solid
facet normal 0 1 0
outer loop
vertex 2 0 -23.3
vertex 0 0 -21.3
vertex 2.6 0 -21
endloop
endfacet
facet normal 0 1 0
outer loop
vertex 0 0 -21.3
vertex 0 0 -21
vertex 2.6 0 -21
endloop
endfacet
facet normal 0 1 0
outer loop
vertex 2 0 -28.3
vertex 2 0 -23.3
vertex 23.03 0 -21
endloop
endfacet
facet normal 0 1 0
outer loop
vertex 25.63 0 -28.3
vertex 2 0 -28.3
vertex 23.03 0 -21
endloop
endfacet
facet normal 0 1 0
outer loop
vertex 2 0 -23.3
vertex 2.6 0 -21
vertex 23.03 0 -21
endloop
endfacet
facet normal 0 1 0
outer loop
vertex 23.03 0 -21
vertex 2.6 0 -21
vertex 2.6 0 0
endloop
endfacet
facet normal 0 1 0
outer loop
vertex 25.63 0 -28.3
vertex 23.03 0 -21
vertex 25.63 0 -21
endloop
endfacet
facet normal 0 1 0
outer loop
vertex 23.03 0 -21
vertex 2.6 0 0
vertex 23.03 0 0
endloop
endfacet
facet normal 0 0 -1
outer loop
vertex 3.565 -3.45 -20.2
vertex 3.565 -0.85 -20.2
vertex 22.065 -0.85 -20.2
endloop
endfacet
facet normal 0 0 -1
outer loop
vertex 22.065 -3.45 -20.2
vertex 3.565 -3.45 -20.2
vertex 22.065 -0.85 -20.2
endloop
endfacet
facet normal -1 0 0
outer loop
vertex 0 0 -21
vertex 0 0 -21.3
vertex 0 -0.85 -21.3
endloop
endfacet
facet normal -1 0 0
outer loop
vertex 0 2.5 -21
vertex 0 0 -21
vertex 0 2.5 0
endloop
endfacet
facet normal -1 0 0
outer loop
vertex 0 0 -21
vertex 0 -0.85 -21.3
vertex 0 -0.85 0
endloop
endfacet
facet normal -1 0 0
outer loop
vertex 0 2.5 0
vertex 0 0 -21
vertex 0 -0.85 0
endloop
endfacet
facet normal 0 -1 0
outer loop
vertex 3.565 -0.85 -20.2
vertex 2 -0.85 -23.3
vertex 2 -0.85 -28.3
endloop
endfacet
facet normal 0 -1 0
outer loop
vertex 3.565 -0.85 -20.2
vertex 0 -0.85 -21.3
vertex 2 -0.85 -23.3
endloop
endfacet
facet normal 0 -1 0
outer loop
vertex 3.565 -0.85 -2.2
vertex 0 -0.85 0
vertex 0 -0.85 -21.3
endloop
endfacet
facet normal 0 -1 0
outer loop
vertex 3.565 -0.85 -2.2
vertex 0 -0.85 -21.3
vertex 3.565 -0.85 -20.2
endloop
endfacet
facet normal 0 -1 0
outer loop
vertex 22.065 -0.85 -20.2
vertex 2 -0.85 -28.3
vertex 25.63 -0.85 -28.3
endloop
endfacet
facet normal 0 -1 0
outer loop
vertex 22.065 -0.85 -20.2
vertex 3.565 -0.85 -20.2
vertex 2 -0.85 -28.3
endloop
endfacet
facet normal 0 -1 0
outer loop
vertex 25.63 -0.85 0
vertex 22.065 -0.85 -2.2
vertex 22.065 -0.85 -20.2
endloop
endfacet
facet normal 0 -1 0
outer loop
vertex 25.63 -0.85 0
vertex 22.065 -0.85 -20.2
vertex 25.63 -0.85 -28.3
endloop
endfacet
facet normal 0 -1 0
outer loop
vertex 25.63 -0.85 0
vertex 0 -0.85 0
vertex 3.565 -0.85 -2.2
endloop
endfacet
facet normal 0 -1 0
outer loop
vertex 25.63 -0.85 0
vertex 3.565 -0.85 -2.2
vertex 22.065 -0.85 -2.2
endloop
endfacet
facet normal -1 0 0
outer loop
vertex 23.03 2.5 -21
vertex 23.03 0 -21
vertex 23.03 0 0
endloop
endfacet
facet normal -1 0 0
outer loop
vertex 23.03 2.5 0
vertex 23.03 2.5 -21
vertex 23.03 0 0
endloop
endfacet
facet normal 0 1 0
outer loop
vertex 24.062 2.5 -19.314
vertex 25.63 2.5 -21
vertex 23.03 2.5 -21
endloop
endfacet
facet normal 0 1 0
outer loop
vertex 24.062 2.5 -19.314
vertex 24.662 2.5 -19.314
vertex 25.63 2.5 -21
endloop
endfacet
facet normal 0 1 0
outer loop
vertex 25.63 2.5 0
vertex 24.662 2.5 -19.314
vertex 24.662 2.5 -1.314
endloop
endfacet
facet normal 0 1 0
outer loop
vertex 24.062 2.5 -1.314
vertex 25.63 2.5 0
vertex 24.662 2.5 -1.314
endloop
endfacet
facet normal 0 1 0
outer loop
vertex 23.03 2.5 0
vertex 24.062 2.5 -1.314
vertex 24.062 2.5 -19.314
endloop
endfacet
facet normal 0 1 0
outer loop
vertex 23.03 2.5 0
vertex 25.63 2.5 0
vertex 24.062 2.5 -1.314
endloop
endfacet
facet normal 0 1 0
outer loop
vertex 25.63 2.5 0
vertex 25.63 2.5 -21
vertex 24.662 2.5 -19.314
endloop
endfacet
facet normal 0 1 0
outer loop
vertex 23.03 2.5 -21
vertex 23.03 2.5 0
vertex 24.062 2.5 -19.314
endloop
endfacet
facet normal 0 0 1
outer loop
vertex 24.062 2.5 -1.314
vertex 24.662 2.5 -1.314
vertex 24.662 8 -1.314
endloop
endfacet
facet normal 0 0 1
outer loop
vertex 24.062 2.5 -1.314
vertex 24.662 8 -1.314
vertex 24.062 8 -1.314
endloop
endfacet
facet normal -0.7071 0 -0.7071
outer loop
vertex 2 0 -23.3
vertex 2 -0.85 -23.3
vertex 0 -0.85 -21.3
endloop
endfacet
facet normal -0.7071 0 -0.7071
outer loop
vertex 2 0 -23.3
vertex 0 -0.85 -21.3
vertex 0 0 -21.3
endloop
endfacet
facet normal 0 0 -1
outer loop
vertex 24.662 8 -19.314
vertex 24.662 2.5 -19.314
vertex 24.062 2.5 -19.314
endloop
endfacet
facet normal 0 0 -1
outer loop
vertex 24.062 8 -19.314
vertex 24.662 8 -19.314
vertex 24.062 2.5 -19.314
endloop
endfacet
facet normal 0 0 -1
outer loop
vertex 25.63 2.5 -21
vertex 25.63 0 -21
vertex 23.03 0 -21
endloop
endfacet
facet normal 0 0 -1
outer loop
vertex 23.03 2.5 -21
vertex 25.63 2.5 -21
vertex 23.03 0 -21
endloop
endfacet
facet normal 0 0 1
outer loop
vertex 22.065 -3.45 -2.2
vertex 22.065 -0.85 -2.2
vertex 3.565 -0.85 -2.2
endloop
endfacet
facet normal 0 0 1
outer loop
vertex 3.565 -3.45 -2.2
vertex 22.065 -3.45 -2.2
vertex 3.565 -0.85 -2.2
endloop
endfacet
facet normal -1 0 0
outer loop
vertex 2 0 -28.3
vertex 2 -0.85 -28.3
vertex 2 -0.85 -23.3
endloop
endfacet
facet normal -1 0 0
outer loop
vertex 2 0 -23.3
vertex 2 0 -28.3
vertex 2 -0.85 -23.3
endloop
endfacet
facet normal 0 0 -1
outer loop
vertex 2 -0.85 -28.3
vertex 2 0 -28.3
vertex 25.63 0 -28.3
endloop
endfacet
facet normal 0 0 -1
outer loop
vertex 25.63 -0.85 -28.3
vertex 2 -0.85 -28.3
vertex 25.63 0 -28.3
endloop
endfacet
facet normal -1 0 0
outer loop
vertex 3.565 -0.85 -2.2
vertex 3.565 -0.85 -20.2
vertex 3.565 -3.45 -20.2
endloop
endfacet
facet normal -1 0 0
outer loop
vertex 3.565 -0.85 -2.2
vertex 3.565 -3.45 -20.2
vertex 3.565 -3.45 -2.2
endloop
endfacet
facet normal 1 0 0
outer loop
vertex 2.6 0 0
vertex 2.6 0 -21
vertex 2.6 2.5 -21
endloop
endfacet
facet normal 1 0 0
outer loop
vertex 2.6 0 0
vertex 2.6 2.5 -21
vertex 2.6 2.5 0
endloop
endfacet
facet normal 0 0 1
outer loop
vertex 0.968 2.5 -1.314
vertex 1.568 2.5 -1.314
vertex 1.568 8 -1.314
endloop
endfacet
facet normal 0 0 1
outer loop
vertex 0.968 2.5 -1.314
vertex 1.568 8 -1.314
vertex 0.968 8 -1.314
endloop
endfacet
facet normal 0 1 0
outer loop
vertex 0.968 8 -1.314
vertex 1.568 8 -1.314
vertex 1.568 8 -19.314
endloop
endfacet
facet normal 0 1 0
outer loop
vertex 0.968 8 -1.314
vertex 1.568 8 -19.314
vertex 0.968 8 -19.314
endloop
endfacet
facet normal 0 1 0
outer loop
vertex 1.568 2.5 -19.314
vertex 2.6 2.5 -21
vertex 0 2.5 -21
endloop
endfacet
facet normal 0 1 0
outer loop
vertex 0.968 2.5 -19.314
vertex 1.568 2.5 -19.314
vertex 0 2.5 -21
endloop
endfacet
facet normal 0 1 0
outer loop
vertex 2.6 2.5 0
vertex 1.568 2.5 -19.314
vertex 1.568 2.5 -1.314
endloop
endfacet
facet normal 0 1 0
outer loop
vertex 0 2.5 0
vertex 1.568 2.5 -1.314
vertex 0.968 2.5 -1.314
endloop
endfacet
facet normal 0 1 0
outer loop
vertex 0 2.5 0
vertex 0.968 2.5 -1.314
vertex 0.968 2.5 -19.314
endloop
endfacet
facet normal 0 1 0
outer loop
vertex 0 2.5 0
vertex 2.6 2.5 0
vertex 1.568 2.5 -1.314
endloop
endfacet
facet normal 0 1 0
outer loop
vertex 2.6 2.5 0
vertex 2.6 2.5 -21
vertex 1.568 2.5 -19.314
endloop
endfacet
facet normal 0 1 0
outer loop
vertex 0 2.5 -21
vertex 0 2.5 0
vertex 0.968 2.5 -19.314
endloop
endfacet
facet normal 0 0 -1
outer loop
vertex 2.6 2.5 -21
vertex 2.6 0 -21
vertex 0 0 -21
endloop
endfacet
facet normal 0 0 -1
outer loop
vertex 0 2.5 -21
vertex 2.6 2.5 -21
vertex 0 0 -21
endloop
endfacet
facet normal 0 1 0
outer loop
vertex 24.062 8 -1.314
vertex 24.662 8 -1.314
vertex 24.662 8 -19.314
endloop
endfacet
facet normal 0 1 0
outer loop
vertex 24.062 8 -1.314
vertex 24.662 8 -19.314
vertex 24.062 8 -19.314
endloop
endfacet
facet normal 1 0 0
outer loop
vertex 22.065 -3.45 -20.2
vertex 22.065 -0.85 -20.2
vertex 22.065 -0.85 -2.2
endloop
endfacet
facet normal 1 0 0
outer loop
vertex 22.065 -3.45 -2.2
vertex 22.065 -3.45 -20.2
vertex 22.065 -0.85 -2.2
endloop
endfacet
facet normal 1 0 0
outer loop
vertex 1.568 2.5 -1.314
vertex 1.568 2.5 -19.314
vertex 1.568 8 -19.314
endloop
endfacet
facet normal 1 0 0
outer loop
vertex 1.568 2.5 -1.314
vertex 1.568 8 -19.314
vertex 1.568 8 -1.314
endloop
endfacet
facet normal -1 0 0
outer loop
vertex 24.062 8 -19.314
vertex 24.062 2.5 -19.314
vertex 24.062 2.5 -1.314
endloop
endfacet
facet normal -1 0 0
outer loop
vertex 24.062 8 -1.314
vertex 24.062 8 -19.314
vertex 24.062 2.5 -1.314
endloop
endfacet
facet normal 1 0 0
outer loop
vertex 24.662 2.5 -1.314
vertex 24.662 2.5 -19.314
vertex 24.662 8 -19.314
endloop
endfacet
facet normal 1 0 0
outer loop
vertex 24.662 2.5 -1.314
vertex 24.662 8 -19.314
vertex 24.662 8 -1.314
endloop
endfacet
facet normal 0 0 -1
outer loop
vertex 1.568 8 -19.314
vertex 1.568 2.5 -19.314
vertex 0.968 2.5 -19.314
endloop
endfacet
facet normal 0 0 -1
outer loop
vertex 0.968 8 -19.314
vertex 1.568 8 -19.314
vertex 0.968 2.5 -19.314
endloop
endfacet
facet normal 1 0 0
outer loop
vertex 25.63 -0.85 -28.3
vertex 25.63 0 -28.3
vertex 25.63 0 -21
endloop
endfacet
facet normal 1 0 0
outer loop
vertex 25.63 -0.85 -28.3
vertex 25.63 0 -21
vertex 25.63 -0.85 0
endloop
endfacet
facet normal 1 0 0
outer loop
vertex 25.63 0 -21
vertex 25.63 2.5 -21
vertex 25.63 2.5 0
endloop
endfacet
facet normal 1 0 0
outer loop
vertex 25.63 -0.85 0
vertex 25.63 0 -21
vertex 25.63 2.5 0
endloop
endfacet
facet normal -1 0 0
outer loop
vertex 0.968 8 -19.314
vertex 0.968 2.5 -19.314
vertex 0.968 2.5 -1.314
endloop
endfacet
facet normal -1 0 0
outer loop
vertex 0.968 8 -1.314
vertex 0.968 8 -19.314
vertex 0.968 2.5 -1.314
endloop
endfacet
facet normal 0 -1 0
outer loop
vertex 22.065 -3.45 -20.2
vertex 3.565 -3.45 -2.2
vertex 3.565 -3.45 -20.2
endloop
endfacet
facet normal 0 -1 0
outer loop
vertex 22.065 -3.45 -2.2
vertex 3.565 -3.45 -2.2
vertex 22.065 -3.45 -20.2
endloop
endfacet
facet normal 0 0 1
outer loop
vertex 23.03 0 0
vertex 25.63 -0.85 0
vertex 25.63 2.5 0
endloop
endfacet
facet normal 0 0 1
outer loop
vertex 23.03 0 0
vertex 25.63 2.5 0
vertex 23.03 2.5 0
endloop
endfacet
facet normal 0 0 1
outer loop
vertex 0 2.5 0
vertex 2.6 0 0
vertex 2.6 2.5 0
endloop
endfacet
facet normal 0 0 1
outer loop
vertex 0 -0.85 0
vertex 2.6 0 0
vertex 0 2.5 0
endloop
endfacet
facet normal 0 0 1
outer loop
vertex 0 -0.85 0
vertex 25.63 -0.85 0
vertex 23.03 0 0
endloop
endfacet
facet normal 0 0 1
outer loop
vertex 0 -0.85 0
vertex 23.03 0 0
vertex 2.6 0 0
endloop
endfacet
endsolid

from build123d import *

# Parameters (mm, degrees)
F0_W      = 25.63
F0_H      = 28.3
F1_DEPTH  = 0.85
F2_W      = 9.25
F2_H      = 18
F3_DEPTH  = 2.6
F4_W      = 2
F4_H      = 7
F5_DEPTH  = 25
F6_SIZE   = 1.99999
F7_W      = 2.6
F7_H      = 21
F8_DEPTH  = 2.5
F9_W      = 0.6
F9_H      = 18
F10_DEPTH = 5.5


# Not quite as in the source:
# - a fillet or chamfer is up to 0.001 mm smaller than in the source, because OpenCascade refuses the exact size


with BuildPart() as f1:
    # F0 (on Front) → F1 (new body)
    with BuildSketch(Plane.XZ):
        with Locations((12.815, -14.15)):
            Rectangle(F0_W, F0_H)
    extrude(amount=F1_DEPTH)

    # F2 (on face) → F3 (join)
    with BuildSketch(Plane.XZ.offset(0.85)):
        with Locations((8.19, -11.2)):
            Rectangle(F2_W, F2_H)
        with Locations((17.44, -11.2)):
            Rectangle(F2_W, F2_H)
    extrude(amount=F3_DEPTH)

    # F4 (on face) → F5 (cut)
    with BuildSketch(Plane.XZ.offset(0.85)):
        with Locations((1, -24.8)):
            Rectangle(F4_W, F4_H)
    extrude(amount=-F5_DEPTH, mode=Mode.SUBTRACT)

    # F6 (size 2 in the source; OpenCascade refuses exactly that, so slightly less here)
    f6_edges = [f1.edges().sort_by_distance(p)[0] for p in [
        (2, -0.425, -21.3),
    ]]
    chamfer(f6_edges, length=F6_SIZE)

    # F7 (on face) → F8 (join)
    with BuildSketch(Plane(origin=(0, 0, 0), x_dir=(-1, 0, 0), z_dir=(0, 1, 0))):
        with Locations((-1.3, -10.5)):
            Rectangle(F7_W, F7_H)
        with Locations((-24.33, -10.5)):
            Rectangle(F7_W, F7_H)
    extrude(amount=F8_DEPTH)

    # F9 (on face) → F10 (join)
    with BuildSketch(Plane(origin=(0, 2.5, 0), x_dir=(-1, 0, 0), z_dir=(0, 1, 0))):
        with Locations((-1.2680477372, -10.3143126089)):
            Rectangle(F9_W, F9_H)
        with Locations((-24.3619522628, -10.3143126089)):
            Rectangle(F9_W, F9_H)
    extrude(amount=F10_DEPTH)


solid = f1.part
